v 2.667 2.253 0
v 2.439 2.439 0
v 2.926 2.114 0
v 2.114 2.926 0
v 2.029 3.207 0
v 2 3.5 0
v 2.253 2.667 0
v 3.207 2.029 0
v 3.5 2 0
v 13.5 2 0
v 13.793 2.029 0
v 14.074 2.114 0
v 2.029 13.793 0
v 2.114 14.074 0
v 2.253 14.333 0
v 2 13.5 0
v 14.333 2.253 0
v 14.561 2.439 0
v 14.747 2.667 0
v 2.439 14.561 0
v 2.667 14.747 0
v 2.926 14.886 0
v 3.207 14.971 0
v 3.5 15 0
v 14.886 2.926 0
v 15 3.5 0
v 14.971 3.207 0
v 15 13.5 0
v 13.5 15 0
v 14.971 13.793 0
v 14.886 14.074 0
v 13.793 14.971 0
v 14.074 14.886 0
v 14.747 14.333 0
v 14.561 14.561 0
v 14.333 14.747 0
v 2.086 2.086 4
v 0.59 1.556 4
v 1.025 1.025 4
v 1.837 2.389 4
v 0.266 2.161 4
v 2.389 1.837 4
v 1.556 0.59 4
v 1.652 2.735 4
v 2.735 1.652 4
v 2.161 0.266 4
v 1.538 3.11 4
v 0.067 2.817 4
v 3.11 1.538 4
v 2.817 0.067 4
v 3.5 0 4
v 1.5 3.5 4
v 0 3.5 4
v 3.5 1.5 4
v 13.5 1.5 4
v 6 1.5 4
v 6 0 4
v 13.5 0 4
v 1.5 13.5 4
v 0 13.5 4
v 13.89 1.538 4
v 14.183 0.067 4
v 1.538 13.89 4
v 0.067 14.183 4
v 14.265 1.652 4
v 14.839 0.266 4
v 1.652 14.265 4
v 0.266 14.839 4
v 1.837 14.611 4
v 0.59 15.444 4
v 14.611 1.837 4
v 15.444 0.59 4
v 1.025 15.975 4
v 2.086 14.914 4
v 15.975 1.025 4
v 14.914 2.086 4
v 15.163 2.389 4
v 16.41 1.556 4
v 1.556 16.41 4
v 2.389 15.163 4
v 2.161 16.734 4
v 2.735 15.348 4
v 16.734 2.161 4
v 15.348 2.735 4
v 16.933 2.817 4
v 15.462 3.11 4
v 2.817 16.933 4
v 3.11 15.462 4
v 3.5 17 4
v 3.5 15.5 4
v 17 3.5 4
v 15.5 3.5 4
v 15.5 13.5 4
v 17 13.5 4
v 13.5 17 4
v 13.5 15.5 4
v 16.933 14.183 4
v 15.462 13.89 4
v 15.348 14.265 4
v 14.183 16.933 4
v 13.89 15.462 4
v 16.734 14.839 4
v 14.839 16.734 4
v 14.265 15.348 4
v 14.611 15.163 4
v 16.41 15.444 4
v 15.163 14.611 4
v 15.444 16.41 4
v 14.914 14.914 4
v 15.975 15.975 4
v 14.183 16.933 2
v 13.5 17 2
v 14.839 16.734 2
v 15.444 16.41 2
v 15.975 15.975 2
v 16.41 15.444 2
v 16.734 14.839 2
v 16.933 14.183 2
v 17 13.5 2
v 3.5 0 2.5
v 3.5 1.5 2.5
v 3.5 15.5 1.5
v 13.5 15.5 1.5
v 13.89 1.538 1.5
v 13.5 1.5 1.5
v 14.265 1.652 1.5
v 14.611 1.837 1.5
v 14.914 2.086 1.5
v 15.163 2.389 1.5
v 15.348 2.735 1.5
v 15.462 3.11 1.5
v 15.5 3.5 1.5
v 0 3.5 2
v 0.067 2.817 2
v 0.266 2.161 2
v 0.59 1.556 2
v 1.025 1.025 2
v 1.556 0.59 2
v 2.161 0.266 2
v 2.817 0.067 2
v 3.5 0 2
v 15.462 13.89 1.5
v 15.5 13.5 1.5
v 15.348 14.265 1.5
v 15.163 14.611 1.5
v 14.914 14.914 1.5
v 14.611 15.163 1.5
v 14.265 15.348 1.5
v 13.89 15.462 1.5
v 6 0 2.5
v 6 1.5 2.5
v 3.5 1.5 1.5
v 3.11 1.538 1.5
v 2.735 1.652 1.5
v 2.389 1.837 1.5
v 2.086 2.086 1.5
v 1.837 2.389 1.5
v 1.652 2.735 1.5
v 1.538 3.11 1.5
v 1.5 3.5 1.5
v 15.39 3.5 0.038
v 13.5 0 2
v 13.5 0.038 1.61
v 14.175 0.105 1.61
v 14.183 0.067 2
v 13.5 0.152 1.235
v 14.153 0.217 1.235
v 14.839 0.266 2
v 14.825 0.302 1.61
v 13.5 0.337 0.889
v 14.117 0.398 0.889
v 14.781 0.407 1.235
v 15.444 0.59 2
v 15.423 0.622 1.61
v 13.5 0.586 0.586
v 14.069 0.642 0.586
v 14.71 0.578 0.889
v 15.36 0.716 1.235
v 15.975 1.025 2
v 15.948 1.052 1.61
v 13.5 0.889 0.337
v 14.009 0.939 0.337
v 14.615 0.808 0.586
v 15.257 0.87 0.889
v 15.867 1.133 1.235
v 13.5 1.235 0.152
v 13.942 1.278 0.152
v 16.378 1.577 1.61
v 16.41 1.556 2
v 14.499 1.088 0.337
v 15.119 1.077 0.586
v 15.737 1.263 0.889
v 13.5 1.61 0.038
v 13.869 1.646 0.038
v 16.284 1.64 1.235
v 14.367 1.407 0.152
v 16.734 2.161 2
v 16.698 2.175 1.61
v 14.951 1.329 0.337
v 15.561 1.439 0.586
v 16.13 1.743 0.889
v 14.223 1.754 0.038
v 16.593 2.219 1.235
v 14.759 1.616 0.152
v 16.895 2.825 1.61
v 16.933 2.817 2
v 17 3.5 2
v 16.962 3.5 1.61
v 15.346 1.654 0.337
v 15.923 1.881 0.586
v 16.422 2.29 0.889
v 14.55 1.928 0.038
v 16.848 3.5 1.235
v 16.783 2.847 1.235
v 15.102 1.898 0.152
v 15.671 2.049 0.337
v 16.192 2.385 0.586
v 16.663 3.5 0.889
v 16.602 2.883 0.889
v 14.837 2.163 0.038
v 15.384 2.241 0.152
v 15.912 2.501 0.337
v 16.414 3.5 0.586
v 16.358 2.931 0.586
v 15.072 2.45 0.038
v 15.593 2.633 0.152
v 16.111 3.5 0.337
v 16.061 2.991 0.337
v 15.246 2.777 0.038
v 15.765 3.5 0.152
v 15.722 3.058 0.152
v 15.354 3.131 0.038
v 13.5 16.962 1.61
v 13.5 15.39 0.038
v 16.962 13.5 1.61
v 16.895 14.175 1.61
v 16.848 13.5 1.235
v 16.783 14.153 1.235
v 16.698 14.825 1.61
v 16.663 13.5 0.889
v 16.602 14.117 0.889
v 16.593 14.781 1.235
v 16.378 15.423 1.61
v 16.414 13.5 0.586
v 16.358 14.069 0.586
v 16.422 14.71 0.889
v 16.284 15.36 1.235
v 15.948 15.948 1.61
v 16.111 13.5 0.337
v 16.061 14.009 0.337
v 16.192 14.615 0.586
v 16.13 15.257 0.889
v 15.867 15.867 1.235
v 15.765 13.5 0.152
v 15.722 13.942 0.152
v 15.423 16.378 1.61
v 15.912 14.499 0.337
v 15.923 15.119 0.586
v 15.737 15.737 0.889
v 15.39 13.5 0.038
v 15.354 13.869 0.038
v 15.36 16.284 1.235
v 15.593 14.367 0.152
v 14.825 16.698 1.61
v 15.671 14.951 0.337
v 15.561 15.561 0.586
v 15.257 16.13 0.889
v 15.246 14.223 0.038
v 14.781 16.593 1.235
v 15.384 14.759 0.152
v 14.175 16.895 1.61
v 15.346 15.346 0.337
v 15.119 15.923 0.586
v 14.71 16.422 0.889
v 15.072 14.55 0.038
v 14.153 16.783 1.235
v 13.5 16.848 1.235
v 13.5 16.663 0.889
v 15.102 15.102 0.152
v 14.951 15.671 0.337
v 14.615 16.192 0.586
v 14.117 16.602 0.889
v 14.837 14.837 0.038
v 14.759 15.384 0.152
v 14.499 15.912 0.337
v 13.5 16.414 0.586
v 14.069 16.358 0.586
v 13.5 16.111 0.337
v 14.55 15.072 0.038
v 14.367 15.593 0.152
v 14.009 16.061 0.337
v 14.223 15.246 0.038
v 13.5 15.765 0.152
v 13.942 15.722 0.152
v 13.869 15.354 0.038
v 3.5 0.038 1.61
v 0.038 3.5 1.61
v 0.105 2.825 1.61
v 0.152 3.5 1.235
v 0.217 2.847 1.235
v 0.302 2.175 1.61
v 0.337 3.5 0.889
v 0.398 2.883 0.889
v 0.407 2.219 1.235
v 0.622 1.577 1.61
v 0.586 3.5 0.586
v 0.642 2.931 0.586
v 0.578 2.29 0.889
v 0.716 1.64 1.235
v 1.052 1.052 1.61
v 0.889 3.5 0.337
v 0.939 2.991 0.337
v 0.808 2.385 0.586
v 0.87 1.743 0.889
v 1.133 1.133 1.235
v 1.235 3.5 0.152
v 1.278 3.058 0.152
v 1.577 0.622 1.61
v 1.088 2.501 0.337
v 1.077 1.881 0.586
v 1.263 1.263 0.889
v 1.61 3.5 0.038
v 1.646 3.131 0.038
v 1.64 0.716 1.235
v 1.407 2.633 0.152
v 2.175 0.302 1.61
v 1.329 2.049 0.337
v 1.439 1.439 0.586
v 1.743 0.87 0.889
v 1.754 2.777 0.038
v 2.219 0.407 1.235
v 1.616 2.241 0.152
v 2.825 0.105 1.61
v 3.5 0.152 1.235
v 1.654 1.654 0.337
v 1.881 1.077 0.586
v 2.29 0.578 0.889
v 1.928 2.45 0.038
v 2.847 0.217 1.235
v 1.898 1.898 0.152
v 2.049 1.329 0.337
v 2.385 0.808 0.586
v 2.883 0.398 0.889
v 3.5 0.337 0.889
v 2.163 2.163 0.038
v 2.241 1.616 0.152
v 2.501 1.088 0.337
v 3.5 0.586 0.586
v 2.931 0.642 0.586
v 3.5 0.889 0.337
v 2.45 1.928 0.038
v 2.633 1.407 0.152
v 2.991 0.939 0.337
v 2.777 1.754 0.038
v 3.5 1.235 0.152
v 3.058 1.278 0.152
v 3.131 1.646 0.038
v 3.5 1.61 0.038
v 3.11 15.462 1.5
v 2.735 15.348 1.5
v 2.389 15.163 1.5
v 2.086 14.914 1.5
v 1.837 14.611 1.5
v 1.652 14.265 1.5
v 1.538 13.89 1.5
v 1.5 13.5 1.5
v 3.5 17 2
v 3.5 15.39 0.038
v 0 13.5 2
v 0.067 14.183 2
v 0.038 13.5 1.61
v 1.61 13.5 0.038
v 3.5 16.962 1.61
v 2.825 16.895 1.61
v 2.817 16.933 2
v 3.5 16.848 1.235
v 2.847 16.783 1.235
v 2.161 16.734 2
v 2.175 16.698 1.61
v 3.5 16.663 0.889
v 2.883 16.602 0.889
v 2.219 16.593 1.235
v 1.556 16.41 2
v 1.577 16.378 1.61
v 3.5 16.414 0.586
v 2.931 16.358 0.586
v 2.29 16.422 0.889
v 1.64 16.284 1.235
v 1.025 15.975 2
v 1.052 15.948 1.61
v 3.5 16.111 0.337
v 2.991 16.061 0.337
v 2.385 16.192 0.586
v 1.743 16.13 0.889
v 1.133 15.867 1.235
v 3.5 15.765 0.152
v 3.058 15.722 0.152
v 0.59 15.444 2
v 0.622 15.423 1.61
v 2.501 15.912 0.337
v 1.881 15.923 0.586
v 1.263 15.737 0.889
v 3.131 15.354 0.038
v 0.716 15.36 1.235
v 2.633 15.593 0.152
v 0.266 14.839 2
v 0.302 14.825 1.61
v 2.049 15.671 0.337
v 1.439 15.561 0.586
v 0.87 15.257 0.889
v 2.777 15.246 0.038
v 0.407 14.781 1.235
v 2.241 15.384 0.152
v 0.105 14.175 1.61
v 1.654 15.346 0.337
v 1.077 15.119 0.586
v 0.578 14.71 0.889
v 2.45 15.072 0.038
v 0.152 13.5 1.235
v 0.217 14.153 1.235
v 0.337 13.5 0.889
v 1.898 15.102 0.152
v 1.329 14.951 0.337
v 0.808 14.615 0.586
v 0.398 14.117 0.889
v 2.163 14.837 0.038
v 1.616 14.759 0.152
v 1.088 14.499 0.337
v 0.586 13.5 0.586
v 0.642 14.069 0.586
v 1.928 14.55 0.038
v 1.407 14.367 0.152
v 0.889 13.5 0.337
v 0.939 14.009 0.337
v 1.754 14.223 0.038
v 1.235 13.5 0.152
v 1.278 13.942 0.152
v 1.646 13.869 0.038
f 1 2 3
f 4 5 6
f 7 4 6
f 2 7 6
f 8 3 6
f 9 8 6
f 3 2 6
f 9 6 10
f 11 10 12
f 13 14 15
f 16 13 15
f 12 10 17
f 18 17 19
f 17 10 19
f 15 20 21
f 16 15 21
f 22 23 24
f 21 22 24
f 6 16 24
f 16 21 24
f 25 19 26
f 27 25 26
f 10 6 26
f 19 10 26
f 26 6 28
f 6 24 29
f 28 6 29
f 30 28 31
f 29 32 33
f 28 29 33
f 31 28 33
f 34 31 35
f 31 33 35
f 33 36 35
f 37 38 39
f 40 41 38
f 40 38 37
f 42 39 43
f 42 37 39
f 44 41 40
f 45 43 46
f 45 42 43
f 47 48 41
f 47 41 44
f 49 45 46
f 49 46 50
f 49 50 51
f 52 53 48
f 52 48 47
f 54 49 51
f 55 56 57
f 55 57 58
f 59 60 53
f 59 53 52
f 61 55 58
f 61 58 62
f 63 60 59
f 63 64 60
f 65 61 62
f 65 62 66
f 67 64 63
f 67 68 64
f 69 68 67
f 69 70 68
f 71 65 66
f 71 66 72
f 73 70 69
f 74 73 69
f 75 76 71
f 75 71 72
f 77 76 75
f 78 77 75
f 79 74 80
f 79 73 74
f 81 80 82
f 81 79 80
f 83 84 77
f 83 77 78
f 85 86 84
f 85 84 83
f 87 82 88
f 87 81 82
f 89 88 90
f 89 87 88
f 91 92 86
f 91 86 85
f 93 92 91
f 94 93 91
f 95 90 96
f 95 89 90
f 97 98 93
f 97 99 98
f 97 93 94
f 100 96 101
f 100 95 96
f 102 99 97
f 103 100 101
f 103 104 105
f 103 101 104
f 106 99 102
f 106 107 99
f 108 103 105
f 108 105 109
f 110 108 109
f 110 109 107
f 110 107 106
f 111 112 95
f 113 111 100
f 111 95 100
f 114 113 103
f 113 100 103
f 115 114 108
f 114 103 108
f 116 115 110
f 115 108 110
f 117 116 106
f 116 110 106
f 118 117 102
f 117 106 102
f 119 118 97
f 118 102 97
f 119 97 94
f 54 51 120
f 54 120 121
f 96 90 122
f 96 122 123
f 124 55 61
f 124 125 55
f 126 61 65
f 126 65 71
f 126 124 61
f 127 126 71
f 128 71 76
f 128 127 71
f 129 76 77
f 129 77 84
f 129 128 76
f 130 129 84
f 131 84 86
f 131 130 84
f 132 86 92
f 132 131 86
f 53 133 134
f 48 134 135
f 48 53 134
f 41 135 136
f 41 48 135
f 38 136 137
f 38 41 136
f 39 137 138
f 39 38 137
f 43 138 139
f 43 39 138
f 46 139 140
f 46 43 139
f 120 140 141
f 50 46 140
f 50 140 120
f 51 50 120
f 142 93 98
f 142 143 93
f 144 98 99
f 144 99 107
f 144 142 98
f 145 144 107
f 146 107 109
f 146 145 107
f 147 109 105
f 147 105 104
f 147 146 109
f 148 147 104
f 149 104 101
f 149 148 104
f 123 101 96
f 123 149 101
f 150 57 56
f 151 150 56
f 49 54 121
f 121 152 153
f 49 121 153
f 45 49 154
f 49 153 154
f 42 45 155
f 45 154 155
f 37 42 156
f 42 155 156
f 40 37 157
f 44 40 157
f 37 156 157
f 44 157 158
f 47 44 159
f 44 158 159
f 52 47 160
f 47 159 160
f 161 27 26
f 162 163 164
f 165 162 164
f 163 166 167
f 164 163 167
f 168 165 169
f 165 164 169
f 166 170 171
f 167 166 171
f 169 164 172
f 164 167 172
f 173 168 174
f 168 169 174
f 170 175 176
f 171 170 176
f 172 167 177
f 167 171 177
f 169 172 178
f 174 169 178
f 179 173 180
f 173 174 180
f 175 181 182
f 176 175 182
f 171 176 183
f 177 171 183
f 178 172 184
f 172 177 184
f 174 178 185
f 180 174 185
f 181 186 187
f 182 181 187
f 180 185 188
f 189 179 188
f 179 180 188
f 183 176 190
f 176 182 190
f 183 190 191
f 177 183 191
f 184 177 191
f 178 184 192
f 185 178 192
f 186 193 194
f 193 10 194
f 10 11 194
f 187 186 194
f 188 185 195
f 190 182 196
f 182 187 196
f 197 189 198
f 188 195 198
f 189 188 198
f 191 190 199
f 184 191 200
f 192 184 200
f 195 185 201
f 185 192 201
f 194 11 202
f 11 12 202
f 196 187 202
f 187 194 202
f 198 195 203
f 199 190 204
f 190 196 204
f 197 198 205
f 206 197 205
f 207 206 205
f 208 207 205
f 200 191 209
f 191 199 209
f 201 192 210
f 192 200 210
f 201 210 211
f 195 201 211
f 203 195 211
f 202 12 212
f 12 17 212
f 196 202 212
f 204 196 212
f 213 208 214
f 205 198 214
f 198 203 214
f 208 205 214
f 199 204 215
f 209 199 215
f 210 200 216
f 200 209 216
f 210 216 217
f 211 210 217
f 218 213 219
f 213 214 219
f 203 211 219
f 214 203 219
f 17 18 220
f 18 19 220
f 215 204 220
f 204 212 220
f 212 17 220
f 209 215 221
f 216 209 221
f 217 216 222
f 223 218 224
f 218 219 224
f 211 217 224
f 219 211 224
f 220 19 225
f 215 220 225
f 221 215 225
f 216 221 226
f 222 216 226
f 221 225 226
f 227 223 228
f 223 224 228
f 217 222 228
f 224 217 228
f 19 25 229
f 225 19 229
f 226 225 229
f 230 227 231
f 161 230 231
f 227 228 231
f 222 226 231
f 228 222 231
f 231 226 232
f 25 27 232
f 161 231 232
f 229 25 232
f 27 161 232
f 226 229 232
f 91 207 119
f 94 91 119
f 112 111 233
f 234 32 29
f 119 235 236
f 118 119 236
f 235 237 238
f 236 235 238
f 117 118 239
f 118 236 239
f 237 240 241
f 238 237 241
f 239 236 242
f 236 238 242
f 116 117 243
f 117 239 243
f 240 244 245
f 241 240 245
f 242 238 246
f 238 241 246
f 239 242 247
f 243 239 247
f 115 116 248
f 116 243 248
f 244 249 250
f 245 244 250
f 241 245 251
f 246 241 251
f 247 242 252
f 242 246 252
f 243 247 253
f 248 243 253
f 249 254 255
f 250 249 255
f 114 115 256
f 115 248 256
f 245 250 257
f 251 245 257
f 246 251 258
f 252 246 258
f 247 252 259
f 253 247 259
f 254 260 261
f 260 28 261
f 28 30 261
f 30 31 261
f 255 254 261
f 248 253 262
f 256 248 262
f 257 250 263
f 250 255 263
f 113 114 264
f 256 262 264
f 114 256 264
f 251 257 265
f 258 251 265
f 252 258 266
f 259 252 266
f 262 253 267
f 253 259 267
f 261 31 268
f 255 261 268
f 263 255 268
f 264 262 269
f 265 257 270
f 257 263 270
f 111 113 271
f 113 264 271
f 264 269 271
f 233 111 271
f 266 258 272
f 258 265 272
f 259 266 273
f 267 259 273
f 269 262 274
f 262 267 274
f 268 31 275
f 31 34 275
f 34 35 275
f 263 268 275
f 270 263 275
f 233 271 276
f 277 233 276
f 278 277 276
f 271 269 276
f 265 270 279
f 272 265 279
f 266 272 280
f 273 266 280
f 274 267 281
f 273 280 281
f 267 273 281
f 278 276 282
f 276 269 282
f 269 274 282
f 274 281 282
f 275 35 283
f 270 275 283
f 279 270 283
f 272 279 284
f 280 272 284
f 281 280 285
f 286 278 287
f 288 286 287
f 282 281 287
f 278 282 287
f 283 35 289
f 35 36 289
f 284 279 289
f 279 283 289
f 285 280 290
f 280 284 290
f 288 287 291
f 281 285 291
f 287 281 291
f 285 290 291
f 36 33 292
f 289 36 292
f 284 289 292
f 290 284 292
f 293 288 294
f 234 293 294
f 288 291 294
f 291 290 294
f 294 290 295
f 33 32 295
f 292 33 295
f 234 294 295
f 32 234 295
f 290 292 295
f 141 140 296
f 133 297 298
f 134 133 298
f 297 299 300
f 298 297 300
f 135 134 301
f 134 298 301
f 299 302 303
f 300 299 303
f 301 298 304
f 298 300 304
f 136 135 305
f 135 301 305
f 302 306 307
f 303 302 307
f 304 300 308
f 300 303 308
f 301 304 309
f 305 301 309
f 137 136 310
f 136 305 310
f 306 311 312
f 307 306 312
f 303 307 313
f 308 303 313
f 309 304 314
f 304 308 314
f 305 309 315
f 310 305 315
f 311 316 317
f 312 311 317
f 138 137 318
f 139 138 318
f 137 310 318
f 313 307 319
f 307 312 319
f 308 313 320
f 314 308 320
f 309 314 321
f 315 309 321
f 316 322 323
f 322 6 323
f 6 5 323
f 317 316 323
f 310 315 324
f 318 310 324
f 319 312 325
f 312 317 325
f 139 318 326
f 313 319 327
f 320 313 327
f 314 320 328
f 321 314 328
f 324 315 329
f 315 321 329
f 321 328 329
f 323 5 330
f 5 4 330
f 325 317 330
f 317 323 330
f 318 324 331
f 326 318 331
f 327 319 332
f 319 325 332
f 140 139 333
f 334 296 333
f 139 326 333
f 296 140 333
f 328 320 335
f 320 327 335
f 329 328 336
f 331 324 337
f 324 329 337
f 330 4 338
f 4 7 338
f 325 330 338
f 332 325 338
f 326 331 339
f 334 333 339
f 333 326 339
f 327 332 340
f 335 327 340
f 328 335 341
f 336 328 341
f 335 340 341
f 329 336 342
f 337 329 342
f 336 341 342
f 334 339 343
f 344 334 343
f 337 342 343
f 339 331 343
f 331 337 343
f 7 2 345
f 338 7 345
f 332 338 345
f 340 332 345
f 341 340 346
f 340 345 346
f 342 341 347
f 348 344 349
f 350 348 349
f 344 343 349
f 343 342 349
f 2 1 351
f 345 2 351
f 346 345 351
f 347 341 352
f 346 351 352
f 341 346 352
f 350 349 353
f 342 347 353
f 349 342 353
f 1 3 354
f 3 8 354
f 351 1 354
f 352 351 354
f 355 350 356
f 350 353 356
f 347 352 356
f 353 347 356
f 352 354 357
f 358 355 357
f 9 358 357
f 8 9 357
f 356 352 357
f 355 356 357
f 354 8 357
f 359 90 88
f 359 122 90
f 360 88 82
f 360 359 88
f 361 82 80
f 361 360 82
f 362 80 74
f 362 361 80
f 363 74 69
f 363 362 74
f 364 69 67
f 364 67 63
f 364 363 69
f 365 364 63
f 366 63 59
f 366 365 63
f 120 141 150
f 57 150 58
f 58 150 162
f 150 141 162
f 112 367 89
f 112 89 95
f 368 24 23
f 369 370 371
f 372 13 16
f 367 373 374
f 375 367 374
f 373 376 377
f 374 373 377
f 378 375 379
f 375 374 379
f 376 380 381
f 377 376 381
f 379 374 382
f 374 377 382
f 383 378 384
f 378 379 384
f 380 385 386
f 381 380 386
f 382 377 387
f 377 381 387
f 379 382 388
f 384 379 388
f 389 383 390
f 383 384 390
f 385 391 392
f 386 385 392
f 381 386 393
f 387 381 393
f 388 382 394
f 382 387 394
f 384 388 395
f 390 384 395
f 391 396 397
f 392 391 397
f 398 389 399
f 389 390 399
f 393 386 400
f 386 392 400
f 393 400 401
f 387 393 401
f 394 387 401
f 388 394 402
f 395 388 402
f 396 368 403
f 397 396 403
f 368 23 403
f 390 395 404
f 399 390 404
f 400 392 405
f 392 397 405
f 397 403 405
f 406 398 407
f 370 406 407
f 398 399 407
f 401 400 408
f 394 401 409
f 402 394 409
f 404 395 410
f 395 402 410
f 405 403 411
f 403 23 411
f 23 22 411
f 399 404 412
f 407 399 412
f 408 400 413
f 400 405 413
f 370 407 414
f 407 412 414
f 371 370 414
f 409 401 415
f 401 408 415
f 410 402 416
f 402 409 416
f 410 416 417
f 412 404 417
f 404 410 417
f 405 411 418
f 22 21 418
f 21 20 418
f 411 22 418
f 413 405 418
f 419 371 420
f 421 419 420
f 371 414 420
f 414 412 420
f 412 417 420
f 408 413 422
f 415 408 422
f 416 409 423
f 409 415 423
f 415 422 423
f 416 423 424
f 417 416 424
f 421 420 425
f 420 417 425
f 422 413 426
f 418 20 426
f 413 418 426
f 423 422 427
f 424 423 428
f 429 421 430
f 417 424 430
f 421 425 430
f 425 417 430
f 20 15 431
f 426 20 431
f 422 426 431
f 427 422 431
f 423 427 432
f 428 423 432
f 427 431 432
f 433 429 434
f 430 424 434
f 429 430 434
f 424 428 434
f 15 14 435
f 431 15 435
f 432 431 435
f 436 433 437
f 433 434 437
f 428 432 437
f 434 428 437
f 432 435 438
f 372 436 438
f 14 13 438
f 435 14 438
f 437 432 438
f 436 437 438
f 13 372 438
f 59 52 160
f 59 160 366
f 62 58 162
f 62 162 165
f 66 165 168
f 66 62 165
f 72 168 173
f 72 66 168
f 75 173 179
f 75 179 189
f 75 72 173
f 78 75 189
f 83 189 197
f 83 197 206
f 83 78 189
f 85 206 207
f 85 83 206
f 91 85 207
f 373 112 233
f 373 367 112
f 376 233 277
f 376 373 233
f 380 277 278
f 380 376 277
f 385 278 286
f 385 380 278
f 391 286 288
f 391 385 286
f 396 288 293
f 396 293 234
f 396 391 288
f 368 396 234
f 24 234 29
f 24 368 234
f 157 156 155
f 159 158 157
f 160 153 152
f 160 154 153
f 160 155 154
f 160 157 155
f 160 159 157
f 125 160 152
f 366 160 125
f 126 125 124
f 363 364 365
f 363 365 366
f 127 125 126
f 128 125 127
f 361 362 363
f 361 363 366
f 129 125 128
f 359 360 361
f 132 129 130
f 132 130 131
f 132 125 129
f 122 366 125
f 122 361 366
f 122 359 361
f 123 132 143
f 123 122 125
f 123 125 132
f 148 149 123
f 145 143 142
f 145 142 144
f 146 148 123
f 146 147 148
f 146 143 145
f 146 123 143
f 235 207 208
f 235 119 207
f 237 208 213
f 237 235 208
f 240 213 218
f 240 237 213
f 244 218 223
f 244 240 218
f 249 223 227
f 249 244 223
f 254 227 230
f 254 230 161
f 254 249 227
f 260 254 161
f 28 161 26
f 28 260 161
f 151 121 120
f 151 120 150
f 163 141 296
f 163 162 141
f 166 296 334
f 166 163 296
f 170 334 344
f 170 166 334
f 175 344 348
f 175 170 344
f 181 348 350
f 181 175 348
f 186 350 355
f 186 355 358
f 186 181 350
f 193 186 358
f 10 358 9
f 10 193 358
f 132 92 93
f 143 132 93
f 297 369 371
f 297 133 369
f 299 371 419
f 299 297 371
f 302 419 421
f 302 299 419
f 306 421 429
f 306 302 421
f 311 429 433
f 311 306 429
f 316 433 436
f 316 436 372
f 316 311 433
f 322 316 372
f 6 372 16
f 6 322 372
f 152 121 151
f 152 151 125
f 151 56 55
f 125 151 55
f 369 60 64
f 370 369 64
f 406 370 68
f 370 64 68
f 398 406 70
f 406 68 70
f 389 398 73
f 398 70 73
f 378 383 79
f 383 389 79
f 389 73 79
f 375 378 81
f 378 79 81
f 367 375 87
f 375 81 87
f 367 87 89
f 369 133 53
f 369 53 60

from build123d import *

# Parameters (mm, degrees)
SKETCH1_W           = 17
SKETCH1_H           = 17
BOSS_EXTRUDE1_DEPTH = 4
SKETCH2_W           = 14
SKETCH2_H           = 14
CUT_EXTRUDE1_DEPTH  = 2.5
FILLET1_R           = 2
FILLET2_R           = 3.5
SKETCH3_W           = 2.5
SKETCH3_H           = 1.5
CUT_EXTRUDE2_DEPTH  = 1.5
FILLET3_R           = 2


with BuildPart() as part:
    # Sketch1 → Boss-Extrude1 (new body)
    with BuildSketch(Plane.XY):
        with Locations((8.5, 8.5)):
            Rectangle(SKETCH1_W, SKETCH1_H)
    extrude(amount=BOSS_EXTRUDE1_DEPTH)

    # Sketch2 → Cut-Extrude1 (cut)
    with BuildSketch(Plane.XY.offset(4)):
        with Locations((8.5, 8.5)):
            Rectangle(SKETCH2_W, SKETCH2_H)
    extrude(amount=-CUT_EXTRUDE1_DEPTH, mode=Mode.SUBTRACT)

    # Fillet1
    fillet1_edges = [part.edges().sort_by_distance(p)[0] for p in [
        (1.5, 1.5, 2.75),
        (1.5, 15.5, 2.75),
        (15.5, 15.5, 2.75),
        (15.5, 1.5, 2.75),
    ]]
    fillet(fillet1_edges, radius=FILLET1_R)

    # Fillet2
    fillet2_edges = [part.edges().sort_by_distance(p)[0] for p in [
        (0, 17, 2),
        (17, 17, 2),
        (17, 0, 2),
        (0, 0, 2),
    ]]
    fillet(fillet2_edges, radius=FILLET2_R)

    # Sketch3 → Cut-Extrude2 (cut)
    with BuildSketch(Plane.XY.offset(4)):
        with Locations((4.75, 0.75)):
            Rectangle(SKETCH3_W, SKETCH3_H)
    extrude(amount=-CUT_EXTRUDE2_DEPTH, mode=Mode.SUBTRACT)

    # Fillet3
    fillet3_edges = [part.edges().sort_by_distance(p)[0] for p in [
        (17, 8.5, 0),
        (0, 8.5, 0),
        (8.5, 17, 0),
        (8.5, 0, 0),
        (1.025126266, 15.974873734, 0),
        (15.974873734, 15.974873734, 0),
        (1.025126266, 1.025126266, 0),
        (15.974873734, 1.025126266, 0),
    ]]
    fillet(fillet3_edges, radius=FILLET3_R)


solid = part.part
